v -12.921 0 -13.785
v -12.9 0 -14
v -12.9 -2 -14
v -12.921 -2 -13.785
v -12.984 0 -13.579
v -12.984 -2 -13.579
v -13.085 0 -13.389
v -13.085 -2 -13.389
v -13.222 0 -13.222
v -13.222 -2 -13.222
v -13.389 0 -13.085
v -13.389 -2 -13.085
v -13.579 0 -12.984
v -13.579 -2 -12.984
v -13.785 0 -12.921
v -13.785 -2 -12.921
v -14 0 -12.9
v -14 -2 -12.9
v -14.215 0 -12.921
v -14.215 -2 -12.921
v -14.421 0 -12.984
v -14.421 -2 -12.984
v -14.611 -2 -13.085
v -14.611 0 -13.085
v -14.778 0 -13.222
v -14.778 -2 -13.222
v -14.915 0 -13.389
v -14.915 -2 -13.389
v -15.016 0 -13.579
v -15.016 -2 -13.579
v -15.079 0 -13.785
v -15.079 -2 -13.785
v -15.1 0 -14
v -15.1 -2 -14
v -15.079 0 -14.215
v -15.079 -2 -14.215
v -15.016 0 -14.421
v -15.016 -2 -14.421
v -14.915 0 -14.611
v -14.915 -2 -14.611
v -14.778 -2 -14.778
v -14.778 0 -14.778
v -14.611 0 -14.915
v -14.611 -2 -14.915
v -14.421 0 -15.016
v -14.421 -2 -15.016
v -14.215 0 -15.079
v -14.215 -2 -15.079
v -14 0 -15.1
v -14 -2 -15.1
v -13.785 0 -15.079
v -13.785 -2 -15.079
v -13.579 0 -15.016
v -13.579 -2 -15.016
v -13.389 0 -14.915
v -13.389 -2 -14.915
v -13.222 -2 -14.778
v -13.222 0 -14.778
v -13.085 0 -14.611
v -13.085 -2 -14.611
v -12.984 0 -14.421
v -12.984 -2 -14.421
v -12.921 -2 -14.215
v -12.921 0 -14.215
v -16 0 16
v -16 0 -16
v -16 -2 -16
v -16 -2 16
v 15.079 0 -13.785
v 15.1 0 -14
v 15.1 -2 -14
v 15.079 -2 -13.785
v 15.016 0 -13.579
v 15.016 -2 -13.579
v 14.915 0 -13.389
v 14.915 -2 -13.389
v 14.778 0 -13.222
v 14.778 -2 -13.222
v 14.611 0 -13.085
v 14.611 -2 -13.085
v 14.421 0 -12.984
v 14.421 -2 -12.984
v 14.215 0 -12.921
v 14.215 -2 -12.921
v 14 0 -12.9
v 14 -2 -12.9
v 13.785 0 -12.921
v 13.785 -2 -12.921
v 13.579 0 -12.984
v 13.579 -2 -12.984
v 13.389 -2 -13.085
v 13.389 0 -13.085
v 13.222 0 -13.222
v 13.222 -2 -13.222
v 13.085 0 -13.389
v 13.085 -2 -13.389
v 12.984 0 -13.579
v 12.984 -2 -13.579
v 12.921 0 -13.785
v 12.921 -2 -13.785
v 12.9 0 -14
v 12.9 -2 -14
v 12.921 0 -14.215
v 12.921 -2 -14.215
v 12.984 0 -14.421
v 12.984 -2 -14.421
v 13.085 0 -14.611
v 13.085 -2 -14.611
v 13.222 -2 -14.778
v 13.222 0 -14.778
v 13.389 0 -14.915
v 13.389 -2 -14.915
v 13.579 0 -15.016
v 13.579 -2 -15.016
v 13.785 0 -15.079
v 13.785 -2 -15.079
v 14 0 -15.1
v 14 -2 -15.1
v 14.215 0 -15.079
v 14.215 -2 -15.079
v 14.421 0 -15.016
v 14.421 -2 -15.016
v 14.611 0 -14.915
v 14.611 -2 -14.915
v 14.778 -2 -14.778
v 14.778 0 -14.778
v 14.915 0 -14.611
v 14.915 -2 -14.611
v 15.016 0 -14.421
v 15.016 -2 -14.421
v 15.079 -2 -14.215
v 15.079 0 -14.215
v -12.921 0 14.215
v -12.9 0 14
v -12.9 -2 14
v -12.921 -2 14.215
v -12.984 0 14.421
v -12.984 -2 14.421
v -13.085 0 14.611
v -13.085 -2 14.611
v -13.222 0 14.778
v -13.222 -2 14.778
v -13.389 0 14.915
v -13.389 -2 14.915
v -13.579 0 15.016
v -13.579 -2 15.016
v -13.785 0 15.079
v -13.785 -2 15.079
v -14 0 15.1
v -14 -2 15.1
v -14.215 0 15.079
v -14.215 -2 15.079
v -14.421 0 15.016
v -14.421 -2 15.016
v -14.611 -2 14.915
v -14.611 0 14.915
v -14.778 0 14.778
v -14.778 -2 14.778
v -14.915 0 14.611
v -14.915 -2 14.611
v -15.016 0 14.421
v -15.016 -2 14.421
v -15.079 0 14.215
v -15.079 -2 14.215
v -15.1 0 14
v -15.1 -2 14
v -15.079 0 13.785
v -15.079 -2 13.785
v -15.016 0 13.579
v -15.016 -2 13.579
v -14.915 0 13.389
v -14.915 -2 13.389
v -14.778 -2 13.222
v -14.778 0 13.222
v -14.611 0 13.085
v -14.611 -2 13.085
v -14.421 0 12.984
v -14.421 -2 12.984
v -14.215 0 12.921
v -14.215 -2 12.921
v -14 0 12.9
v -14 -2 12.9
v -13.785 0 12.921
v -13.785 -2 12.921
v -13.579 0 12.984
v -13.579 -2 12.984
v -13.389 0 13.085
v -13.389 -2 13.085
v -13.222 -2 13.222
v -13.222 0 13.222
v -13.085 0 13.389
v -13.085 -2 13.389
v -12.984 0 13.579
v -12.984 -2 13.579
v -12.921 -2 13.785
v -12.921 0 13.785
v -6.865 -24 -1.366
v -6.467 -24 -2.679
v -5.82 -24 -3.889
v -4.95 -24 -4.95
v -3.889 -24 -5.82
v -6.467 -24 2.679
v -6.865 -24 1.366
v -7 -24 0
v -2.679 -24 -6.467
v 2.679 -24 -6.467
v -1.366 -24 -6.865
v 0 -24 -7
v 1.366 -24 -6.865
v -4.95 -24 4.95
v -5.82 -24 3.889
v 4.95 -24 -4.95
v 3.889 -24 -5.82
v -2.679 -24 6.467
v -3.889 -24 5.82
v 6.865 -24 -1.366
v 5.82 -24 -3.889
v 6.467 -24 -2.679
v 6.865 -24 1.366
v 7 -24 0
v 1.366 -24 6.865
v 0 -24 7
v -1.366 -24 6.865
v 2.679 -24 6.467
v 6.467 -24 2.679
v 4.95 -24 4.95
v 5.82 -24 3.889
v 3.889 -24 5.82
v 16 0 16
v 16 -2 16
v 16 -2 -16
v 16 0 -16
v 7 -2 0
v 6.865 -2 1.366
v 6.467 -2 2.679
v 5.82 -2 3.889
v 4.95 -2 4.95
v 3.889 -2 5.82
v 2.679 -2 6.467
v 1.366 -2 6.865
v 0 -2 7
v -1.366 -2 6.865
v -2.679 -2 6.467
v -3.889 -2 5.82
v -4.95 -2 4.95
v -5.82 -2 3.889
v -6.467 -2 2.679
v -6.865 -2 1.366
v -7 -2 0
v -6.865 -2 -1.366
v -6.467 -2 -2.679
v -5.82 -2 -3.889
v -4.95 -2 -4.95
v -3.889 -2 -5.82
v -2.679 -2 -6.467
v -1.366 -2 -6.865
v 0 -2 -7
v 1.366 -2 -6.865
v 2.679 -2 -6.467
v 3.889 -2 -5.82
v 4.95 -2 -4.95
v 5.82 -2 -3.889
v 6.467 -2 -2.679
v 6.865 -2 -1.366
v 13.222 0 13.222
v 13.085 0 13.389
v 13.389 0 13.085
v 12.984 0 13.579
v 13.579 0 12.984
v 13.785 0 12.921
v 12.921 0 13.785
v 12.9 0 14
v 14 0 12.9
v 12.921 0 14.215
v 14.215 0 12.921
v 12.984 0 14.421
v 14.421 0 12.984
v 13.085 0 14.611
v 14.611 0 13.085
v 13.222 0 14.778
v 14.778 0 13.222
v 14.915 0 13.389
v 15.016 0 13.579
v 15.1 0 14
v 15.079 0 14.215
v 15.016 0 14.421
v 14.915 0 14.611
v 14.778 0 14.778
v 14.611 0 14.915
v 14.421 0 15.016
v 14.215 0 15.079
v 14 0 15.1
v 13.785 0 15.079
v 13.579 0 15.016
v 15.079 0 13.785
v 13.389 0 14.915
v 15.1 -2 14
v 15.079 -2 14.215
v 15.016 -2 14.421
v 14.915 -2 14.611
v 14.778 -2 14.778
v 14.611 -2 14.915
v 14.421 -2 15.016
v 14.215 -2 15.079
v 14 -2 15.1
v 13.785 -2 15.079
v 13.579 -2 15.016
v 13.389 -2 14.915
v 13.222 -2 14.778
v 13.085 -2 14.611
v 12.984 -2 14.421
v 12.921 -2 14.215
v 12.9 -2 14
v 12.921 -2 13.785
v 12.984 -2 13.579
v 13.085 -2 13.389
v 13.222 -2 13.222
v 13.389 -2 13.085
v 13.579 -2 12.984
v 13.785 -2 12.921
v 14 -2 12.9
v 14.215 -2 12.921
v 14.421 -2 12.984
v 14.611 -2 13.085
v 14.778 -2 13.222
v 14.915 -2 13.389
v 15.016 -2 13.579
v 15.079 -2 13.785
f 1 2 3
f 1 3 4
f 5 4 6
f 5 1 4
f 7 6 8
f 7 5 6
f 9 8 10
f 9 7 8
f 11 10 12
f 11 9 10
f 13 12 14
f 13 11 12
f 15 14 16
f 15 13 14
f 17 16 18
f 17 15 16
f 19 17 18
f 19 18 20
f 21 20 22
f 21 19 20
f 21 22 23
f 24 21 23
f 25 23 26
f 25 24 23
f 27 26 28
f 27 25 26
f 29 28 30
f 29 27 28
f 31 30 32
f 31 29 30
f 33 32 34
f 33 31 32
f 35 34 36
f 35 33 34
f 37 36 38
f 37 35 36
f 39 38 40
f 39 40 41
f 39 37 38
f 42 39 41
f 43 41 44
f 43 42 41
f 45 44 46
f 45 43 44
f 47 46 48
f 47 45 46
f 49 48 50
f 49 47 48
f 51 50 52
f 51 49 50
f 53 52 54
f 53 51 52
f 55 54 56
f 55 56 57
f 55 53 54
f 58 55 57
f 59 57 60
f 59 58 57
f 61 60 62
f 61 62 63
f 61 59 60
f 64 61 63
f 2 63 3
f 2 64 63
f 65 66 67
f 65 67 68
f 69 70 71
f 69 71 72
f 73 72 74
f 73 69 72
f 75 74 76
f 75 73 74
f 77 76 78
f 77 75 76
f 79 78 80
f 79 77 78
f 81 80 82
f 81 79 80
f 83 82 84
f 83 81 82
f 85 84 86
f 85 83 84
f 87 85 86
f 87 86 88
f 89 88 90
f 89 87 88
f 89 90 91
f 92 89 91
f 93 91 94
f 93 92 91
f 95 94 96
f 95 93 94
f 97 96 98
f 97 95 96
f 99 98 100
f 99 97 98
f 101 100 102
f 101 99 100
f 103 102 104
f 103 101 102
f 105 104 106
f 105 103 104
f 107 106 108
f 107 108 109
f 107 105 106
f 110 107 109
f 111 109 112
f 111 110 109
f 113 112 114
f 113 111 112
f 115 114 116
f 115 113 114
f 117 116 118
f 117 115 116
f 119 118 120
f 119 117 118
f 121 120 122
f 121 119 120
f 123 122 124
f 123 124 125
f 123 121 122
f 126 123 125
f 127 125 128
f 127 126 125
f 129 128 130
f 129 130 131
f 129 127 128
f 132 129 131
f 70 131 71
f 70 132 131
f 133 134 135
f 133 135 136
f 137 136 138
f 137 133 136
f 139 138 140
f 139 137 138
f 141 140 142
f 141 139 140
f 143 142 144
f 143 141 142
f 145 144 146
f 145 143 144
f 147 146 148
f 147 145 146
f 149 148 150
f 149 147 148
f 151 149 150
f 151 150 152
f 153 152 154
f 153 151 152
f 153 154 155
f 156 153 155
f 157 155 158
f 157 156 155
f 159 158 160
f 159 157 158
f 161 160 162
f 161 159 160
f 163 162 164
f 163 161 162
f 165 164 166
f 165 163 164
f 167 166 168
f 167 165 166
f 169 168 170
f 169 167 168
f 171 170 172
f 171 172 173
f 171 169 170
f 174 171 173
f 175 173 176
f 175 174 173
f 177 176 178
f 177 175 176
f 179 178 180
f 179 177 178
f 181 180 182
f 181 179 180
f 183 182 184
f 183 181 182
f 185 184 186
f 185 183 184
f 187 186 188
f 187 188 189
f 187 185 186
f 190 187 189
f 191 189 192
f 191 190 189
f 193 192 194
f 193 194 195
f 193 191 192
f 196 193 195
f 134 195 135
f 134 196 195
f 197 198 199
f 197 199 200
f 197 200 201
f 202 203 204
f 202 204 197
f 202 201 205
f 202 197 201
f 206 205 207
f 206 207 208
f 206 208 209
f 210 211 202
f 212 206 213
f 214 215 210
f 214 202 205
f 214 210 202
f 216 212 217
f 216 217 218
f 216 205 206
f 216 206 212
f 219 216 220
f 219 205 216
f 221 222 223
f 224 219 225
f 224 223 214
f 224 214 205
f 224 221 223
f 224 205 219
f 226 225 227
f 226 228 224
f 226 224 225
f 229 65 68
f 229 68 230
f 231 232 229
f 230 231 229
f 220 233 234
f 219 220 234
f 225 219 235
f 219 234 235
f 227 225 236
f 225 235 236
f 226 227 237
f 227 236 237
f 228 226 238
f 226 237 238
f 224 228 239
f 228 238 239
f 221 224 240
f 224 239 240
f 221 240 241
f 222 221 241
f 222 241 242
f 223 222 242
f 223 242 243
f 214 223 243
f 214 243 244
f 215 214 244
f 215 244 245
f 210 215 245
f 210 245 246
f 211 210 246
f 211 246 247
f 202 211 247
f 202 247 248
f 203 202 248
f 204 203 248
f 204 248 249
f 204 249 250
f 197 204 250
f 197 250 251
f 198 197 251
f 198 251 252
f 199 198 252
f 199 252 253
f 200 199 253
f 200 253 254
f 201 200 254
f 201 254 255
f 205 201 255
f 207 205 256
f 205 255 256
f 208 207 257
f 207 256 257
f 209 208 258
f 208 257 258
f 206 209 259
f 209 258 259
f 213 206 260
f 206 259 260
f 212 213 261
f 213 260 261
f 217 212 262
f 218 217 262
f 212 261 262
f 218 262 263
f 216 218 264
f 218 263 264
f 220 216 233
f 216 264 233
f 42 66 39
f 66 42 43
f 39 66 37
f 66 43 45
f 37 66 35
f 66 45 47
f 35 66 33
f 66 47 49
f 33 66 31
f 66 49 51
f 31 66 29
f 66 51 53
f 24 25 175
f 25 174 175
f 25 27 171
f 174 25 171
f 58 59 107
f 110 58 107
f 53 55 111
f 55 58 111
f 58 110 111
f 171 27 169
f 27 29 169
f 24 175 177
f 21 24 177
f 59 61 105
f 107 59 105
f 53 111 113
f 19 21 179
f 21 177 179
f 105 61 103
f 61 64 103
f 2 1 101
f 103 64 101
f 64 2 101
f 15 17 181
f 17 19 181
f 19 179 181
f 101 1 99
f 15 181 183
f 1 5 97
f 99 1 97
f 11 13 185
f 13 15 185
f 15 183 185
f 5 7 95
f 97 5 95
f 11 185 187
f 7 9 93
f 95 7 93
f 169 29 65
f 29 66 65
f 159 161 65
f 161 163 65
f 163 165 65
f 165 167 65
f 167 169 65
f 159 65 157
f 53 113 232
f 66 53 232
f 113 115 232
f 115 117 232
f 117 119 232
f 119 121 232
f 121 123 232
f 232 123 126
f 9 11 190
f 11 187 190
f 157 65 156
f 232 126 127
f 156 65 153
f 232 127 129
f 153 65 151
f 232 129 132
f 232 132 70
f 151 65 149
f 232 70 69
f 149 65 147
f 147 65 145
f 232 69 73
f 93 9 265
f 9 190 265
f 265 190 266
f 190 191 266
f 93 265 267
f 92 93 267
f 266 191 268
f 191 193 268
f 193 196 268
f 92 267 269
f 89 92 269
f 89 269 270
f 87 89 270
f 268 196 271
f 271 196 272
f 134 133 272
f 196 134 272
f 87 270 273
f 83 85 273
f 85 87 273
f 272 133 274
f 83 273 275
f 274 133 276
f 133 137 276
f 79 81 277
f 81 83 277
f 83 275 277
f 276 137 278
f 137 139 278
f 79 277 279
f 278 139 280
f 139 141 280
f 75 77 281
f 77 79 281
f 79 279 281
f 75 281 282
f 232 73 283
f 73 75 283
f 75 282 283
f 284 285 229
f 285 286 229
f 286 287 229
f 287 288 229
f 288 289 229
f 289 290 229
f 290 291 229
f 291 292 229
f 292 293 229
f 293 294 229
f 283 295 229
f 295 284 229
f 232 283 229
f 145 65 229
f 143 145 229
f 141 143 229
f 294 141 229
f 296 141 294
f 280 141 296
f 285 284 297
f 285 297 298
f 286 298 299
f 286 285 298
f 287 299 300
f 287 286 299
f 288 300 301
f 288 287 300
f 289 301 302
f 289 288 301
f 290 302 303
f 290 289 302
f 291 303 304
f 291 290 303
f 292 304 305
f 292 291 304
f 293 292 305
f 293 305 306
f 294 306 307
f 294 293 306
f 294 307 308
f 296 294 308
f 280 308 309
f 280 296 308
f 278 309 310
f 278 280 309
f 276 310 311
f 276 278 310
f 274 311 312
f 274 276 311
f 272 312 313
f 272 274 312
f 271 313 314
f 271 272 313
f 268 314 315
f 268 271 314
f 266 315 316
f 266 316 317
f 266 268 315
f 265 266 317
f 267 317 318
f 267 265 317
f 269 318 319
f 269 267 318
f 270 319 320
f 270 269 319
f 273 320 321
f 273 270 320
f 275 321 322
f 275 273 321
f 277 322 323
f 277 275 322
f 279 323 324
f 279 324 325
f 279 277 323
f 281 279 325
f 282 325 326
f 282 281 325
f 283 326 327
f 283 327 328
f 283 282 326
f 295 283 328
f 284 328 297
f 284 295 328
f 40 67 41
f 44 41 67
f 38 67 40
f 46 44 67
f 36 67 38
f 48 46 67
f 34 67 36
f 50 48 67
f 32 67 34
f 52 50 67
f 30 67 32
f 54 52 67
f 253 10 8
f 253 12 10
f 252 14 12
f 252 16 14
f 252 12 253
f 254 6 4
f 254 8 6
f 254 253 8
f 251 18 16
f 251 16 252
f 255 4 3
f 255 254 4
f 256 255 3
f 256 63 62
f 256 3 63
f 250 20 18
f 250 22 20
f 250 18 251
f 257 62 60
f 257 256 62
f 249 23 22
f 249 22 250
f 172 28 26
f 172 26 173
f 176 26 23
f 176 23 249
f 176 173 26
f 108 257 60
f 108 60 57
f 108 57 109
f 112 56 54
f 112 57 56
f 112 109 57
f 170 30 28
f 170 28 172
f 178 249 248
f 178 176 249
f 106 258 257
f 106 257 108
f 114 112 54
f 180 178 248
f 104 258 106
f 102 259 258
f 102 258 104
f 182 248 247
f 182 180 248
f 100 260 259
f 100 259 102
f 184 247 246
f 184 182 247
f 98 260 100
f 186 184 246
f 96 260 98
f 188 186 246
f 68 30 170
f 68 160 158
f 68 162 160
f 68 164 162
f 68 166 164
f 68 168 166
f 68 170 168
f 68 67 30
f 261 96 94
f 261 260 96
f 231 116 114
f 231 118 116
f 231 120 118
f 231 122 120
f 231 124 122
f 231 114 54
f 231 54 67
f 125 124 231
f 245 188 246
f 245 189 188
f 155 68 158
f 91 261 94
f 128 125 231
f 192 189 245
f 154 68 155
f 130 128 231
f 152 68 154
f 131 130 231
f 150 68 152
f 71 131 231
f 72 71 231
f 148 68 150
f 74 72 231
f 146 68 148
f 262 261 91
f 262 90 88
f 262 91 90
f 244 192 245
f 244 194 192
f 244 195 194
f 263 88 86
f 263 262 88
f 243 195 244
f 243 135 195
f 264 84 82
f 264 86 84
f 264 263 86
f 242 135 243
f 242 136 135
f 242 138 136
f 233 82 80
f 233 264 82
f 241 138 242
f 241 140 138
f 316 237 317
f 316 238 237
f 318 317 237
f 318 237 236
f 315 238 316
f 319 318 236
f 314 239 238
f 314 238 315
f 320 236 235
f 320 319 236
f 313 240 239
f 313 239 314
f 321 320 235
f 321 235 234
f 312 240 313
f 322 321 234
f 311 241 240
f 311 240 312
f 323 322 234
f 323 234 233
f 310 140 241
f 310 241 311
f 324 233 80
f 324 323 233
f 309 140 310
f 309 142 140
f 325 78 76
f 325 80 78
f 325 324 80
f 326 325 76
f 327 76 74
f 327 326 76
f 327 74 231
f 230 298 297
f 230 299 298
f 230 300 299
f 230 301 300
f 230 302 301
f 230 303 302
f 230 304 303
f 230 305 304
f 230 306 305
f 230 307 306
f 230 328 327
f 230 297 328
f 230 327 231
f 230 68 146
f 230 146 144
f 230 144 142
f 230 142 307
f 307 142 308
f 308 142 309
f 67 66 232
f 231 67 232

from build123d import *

# Parameters (mm, degrees)
F0_W     = 32
F0_H     = 32
F0_R     = 1.1
F0_R_2   = 7
F1_DEPTH = 2
F2_DEPTH = 24


with BuildPart() as f1:
    # F0 (on Front) → F1 (new body)
    with BuildSketch(Plane.XZ):
        Rectangle(F0_W, F0_H)
        with Locations((-14, -14)):
            Circle(F0_R, mode=Mode.SUBTRACT)
        with Locations((14, -14)):
            Circle(F0_R, mode=Mode.SUBTRACT)
        with Locations((-14, 14)):
            Circle(F0_R, mode=Mode.SUBTRACT)
        Circle(F0_R_2, mode=Mode.SUBTRACT)
        with Locations((14, 14)):
            Circle(F0_R, mode=Mode.SUBTRACT)
        Circle(F0_R_2)
    extrude(amount=F1_DEPTH)

    # F0 (on Front) → F2 (join)
    with BuildSketch(Plane.XZ):
        Circle(F0_R_2)
    extrude(amount=F2_DEPTH)


solid = f1.part
